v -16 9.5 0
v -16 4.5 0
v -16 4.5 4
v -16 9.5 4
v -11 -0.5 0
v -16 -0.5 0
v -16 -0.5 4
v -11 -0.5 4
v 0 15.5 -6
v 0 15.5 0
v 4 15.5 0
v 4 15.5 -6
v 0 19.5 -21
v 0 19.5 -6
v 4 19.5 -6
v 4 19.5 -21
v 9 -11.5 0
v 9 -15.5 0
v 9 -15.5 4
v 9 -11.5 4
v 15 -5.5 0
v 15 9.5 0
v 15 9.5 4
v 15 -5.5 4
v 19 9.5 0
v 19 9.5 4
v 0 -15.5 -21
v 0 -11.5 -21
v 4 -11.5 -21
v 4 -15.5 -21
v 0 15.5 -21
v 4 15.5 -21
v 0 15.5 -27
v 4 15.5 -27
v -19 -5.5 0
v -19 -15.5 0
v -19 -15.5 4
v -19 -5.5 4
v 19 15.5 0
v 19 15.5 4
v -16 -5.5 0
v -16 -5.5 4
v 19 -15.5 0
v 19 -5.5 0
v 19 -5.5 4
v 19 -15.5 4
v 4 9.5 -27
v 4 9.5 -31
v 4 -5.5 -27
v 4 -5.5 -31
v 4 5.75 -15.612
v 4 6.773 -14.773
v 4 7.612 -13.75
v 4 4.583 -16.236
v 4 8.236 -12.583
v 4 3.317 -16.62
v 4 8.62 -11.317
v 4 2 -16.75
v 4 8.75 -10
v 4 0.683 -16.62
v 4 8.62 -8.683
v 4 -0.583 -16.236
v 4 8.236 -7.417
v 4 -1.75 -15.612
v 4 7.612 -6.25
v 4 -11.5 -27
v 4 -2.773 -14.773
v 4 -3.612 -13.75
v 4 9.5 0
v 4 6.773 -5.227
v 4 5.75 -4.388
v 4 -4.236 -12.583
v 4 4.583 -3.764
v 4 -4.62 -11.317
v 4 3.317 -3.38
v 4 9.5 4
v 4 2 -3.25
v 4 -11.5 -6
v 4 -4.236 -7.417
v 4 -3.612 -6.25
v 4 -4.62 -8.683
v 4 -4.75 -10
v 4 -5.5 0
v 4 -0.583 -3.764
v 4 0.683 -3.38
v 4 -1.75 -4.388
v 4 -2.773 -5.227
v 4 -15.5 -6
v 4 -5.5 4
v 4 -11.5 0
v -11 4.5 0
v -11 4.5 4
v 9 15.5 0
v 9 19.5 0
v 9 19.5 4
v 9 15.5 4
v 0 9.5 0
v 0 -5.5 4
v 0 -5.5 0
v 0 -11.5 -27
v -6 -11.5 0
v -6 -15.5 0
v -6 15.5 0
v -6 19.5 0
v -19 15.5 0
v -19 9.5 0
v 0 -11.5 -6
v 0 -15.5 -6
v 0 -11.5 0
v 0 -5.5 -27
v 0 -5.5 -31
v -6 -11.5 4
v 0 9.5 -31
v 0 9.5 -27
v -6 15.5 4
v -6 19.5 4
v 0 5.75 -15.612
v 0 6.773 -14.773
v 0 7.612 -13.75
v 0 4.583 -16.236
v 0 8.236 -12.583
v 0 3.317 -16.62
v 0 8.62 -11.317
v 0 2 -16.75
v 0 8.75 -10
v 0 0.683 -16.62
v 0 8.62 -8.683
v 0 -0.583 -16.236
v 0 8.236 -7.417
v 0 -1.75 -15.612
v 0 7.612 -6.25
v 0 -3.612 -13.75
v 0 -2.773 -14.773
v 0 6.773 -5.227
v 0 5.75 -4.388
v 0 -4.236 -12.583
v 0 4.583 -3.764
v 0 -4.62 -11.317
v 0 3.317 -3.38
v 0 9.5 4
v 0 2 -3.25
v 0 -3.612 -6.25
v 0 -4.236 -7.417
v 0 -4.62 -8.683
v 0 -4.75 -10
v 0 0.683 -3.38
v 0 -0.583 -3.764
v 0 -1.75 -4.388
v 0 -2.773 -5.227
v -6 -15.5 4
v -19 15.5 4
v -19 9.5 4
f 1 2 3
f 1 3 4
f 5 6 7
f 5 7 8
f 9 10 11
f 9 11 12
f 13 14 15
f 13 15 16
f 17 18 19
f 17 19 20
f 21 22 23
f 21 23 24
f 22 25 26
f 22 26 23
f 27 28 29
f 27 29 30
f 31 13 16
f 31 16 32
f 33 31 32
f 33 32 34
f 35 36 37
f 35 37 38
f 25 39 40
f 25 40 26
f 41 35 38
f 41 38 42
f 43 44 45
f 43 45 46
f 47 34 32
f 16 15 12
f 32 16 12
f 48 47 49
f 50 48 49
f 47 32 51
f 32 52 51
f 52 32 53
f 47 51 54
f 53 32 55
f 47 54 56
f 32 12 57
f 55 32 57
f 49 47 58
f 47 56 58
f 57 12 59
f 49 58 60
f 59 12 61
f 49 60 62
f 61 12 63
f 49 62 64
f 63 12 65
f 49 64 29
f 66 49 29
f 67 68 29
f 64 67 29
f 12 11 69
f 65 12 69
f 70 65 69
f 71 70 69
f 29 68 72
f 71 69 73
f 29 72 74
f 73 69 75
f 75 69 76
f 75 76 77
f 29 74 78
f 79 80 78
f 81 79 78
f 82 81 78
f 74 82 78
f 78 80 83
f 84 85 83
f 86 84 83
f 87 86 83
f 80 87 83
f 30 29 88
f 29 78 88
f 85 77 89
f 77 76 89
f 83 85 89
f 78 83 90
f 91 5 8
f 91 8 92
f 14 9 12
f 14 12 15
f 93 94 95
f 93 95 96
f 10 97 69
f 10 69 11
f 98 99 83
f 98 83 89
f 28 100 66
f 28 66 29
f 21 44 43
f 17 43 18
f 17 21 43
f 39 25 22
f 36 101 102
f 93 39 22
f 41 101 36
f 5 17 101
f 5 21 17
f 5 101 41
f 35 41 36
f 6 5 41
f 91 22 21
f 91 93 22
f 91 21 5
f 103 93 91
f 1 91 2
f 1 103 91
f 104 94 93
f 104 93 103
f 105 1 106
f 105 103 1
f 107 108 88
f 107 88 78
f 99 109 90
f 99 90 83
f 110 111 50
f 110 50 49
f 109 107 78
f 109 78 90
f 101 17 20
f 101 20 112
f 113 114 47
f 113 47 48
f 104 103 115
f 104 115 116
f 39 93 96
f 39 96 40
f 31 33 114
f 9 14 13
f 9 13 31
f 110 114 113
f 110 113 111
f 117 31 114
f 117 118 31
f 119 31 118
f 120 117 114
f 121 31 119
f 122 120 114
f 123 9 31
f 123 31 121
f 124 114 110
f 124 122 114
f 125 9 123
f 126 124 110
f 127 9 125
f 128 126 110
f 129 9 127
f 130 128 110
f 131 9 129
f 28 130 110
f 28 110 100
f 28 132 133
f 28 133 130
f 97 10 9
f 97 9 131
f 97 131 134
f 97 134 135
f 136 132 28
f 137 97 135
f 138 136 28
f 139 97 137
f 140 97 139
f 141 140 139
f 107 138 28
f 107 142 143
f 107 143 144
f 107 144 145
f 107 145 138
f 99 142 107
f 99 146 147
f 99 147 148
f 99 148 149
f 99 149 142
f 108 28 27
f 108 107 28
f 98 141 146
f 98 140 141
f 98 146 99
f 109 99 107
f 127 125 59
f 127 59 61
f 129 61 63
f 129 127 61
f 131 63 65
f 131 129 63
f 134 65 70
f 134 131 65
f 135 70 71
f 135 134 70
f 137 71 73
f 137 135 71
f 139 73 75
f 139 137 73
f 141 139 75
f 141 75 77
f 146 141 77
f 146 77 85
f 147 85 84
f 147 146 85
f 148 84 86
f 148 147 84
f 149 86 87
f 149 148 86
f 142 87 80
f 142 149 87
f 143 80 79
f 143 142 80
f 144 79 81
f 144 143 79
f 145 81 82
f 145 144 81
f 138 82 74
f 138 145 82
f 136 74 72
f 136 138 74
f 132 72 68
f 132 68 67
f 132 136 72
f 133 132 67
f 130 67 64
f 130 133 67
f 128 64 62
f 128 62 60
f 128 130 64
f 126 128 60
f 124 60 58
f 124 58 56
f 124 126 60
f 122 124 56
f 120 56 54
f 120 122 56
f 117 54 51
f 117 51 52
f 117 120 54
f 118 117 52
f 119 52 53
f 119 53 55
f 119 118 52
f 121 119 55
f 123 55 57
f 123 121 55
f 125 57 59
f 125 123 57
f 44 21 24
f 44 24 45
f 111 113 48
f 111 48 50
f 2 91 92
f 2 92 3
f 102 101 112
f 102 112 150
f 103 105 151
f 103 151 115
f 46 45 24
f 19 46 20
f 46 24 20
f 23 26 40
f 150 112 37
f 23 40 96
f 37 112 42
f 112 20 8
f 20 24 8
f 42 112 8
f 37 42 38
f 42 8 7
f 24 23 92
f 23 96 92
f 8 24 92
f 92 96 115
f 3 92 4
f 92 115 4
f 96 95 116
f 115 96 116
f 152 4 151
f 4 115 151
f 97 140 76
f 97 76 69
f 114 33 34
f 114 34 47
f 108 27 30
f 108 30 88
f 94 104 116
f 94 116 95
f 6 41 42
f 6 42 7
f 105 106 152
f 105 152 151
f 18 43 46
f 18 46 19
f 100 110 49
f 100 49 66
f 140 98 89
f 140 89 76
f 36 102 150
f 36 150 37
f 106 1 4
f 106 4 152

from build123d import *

# Parameters (mm, degrees)
PAD_DEPTH    = 4
SKETCH001_R  = 6.75
PAD001_DEPTH = 4


with BuildPart() as wall:
    # Sketch → Pad (new body)
    with BuildSketch(Plane.XY):
        Polygon((-19, 15.5), (-6, 15.5), (-6, 19.5), (9, 19.5), (9, 15.5), (19, 15.5), (19, 9.5), (15, 9.5), (15, -5.5), (19, -5.5), (19, -15.5), (9, -15.5), (9, -11.5), (-6, -11.5), (-6, -15.5), (-19, -15.5), (-19, -5.5), (-16, -5.5), (-16, -0.5), (-11, -0.5), (-11, 4.5), (-16, 4.5), (-16, 9.5), (-19, 9.5), align=None)
    extrude(amount=PAD_DEPTH)


with BuildPart() as cover:
    # Sketch001 → Pad001 (new body)
    with BuildSketch(Plane.YZ):
        Polygon((-5.5, 0), (-5.5, 4), (9.5, 4), (9.5, 0), (15.5, 0), (15.5, -6), (19.5, -6), (19.5, -21), (15.5, -21), (15.5, -27), (9.5, -27), (9.5, -31), (-5.5, -31), (-5.5, -27), (-11.5, -27), (-11.5, -21), (-15.5, -21), (-15.5, -6), (-11.5, -6), (-11.5, 0), align=None)
        with Locations((2, -10)):
            Circle(SKETCH001_R, mode=Mode.SUBTRACT)
    extrude(amount=PAD001_DEPTH)


solid = Compound([wall.part, cover.part])
